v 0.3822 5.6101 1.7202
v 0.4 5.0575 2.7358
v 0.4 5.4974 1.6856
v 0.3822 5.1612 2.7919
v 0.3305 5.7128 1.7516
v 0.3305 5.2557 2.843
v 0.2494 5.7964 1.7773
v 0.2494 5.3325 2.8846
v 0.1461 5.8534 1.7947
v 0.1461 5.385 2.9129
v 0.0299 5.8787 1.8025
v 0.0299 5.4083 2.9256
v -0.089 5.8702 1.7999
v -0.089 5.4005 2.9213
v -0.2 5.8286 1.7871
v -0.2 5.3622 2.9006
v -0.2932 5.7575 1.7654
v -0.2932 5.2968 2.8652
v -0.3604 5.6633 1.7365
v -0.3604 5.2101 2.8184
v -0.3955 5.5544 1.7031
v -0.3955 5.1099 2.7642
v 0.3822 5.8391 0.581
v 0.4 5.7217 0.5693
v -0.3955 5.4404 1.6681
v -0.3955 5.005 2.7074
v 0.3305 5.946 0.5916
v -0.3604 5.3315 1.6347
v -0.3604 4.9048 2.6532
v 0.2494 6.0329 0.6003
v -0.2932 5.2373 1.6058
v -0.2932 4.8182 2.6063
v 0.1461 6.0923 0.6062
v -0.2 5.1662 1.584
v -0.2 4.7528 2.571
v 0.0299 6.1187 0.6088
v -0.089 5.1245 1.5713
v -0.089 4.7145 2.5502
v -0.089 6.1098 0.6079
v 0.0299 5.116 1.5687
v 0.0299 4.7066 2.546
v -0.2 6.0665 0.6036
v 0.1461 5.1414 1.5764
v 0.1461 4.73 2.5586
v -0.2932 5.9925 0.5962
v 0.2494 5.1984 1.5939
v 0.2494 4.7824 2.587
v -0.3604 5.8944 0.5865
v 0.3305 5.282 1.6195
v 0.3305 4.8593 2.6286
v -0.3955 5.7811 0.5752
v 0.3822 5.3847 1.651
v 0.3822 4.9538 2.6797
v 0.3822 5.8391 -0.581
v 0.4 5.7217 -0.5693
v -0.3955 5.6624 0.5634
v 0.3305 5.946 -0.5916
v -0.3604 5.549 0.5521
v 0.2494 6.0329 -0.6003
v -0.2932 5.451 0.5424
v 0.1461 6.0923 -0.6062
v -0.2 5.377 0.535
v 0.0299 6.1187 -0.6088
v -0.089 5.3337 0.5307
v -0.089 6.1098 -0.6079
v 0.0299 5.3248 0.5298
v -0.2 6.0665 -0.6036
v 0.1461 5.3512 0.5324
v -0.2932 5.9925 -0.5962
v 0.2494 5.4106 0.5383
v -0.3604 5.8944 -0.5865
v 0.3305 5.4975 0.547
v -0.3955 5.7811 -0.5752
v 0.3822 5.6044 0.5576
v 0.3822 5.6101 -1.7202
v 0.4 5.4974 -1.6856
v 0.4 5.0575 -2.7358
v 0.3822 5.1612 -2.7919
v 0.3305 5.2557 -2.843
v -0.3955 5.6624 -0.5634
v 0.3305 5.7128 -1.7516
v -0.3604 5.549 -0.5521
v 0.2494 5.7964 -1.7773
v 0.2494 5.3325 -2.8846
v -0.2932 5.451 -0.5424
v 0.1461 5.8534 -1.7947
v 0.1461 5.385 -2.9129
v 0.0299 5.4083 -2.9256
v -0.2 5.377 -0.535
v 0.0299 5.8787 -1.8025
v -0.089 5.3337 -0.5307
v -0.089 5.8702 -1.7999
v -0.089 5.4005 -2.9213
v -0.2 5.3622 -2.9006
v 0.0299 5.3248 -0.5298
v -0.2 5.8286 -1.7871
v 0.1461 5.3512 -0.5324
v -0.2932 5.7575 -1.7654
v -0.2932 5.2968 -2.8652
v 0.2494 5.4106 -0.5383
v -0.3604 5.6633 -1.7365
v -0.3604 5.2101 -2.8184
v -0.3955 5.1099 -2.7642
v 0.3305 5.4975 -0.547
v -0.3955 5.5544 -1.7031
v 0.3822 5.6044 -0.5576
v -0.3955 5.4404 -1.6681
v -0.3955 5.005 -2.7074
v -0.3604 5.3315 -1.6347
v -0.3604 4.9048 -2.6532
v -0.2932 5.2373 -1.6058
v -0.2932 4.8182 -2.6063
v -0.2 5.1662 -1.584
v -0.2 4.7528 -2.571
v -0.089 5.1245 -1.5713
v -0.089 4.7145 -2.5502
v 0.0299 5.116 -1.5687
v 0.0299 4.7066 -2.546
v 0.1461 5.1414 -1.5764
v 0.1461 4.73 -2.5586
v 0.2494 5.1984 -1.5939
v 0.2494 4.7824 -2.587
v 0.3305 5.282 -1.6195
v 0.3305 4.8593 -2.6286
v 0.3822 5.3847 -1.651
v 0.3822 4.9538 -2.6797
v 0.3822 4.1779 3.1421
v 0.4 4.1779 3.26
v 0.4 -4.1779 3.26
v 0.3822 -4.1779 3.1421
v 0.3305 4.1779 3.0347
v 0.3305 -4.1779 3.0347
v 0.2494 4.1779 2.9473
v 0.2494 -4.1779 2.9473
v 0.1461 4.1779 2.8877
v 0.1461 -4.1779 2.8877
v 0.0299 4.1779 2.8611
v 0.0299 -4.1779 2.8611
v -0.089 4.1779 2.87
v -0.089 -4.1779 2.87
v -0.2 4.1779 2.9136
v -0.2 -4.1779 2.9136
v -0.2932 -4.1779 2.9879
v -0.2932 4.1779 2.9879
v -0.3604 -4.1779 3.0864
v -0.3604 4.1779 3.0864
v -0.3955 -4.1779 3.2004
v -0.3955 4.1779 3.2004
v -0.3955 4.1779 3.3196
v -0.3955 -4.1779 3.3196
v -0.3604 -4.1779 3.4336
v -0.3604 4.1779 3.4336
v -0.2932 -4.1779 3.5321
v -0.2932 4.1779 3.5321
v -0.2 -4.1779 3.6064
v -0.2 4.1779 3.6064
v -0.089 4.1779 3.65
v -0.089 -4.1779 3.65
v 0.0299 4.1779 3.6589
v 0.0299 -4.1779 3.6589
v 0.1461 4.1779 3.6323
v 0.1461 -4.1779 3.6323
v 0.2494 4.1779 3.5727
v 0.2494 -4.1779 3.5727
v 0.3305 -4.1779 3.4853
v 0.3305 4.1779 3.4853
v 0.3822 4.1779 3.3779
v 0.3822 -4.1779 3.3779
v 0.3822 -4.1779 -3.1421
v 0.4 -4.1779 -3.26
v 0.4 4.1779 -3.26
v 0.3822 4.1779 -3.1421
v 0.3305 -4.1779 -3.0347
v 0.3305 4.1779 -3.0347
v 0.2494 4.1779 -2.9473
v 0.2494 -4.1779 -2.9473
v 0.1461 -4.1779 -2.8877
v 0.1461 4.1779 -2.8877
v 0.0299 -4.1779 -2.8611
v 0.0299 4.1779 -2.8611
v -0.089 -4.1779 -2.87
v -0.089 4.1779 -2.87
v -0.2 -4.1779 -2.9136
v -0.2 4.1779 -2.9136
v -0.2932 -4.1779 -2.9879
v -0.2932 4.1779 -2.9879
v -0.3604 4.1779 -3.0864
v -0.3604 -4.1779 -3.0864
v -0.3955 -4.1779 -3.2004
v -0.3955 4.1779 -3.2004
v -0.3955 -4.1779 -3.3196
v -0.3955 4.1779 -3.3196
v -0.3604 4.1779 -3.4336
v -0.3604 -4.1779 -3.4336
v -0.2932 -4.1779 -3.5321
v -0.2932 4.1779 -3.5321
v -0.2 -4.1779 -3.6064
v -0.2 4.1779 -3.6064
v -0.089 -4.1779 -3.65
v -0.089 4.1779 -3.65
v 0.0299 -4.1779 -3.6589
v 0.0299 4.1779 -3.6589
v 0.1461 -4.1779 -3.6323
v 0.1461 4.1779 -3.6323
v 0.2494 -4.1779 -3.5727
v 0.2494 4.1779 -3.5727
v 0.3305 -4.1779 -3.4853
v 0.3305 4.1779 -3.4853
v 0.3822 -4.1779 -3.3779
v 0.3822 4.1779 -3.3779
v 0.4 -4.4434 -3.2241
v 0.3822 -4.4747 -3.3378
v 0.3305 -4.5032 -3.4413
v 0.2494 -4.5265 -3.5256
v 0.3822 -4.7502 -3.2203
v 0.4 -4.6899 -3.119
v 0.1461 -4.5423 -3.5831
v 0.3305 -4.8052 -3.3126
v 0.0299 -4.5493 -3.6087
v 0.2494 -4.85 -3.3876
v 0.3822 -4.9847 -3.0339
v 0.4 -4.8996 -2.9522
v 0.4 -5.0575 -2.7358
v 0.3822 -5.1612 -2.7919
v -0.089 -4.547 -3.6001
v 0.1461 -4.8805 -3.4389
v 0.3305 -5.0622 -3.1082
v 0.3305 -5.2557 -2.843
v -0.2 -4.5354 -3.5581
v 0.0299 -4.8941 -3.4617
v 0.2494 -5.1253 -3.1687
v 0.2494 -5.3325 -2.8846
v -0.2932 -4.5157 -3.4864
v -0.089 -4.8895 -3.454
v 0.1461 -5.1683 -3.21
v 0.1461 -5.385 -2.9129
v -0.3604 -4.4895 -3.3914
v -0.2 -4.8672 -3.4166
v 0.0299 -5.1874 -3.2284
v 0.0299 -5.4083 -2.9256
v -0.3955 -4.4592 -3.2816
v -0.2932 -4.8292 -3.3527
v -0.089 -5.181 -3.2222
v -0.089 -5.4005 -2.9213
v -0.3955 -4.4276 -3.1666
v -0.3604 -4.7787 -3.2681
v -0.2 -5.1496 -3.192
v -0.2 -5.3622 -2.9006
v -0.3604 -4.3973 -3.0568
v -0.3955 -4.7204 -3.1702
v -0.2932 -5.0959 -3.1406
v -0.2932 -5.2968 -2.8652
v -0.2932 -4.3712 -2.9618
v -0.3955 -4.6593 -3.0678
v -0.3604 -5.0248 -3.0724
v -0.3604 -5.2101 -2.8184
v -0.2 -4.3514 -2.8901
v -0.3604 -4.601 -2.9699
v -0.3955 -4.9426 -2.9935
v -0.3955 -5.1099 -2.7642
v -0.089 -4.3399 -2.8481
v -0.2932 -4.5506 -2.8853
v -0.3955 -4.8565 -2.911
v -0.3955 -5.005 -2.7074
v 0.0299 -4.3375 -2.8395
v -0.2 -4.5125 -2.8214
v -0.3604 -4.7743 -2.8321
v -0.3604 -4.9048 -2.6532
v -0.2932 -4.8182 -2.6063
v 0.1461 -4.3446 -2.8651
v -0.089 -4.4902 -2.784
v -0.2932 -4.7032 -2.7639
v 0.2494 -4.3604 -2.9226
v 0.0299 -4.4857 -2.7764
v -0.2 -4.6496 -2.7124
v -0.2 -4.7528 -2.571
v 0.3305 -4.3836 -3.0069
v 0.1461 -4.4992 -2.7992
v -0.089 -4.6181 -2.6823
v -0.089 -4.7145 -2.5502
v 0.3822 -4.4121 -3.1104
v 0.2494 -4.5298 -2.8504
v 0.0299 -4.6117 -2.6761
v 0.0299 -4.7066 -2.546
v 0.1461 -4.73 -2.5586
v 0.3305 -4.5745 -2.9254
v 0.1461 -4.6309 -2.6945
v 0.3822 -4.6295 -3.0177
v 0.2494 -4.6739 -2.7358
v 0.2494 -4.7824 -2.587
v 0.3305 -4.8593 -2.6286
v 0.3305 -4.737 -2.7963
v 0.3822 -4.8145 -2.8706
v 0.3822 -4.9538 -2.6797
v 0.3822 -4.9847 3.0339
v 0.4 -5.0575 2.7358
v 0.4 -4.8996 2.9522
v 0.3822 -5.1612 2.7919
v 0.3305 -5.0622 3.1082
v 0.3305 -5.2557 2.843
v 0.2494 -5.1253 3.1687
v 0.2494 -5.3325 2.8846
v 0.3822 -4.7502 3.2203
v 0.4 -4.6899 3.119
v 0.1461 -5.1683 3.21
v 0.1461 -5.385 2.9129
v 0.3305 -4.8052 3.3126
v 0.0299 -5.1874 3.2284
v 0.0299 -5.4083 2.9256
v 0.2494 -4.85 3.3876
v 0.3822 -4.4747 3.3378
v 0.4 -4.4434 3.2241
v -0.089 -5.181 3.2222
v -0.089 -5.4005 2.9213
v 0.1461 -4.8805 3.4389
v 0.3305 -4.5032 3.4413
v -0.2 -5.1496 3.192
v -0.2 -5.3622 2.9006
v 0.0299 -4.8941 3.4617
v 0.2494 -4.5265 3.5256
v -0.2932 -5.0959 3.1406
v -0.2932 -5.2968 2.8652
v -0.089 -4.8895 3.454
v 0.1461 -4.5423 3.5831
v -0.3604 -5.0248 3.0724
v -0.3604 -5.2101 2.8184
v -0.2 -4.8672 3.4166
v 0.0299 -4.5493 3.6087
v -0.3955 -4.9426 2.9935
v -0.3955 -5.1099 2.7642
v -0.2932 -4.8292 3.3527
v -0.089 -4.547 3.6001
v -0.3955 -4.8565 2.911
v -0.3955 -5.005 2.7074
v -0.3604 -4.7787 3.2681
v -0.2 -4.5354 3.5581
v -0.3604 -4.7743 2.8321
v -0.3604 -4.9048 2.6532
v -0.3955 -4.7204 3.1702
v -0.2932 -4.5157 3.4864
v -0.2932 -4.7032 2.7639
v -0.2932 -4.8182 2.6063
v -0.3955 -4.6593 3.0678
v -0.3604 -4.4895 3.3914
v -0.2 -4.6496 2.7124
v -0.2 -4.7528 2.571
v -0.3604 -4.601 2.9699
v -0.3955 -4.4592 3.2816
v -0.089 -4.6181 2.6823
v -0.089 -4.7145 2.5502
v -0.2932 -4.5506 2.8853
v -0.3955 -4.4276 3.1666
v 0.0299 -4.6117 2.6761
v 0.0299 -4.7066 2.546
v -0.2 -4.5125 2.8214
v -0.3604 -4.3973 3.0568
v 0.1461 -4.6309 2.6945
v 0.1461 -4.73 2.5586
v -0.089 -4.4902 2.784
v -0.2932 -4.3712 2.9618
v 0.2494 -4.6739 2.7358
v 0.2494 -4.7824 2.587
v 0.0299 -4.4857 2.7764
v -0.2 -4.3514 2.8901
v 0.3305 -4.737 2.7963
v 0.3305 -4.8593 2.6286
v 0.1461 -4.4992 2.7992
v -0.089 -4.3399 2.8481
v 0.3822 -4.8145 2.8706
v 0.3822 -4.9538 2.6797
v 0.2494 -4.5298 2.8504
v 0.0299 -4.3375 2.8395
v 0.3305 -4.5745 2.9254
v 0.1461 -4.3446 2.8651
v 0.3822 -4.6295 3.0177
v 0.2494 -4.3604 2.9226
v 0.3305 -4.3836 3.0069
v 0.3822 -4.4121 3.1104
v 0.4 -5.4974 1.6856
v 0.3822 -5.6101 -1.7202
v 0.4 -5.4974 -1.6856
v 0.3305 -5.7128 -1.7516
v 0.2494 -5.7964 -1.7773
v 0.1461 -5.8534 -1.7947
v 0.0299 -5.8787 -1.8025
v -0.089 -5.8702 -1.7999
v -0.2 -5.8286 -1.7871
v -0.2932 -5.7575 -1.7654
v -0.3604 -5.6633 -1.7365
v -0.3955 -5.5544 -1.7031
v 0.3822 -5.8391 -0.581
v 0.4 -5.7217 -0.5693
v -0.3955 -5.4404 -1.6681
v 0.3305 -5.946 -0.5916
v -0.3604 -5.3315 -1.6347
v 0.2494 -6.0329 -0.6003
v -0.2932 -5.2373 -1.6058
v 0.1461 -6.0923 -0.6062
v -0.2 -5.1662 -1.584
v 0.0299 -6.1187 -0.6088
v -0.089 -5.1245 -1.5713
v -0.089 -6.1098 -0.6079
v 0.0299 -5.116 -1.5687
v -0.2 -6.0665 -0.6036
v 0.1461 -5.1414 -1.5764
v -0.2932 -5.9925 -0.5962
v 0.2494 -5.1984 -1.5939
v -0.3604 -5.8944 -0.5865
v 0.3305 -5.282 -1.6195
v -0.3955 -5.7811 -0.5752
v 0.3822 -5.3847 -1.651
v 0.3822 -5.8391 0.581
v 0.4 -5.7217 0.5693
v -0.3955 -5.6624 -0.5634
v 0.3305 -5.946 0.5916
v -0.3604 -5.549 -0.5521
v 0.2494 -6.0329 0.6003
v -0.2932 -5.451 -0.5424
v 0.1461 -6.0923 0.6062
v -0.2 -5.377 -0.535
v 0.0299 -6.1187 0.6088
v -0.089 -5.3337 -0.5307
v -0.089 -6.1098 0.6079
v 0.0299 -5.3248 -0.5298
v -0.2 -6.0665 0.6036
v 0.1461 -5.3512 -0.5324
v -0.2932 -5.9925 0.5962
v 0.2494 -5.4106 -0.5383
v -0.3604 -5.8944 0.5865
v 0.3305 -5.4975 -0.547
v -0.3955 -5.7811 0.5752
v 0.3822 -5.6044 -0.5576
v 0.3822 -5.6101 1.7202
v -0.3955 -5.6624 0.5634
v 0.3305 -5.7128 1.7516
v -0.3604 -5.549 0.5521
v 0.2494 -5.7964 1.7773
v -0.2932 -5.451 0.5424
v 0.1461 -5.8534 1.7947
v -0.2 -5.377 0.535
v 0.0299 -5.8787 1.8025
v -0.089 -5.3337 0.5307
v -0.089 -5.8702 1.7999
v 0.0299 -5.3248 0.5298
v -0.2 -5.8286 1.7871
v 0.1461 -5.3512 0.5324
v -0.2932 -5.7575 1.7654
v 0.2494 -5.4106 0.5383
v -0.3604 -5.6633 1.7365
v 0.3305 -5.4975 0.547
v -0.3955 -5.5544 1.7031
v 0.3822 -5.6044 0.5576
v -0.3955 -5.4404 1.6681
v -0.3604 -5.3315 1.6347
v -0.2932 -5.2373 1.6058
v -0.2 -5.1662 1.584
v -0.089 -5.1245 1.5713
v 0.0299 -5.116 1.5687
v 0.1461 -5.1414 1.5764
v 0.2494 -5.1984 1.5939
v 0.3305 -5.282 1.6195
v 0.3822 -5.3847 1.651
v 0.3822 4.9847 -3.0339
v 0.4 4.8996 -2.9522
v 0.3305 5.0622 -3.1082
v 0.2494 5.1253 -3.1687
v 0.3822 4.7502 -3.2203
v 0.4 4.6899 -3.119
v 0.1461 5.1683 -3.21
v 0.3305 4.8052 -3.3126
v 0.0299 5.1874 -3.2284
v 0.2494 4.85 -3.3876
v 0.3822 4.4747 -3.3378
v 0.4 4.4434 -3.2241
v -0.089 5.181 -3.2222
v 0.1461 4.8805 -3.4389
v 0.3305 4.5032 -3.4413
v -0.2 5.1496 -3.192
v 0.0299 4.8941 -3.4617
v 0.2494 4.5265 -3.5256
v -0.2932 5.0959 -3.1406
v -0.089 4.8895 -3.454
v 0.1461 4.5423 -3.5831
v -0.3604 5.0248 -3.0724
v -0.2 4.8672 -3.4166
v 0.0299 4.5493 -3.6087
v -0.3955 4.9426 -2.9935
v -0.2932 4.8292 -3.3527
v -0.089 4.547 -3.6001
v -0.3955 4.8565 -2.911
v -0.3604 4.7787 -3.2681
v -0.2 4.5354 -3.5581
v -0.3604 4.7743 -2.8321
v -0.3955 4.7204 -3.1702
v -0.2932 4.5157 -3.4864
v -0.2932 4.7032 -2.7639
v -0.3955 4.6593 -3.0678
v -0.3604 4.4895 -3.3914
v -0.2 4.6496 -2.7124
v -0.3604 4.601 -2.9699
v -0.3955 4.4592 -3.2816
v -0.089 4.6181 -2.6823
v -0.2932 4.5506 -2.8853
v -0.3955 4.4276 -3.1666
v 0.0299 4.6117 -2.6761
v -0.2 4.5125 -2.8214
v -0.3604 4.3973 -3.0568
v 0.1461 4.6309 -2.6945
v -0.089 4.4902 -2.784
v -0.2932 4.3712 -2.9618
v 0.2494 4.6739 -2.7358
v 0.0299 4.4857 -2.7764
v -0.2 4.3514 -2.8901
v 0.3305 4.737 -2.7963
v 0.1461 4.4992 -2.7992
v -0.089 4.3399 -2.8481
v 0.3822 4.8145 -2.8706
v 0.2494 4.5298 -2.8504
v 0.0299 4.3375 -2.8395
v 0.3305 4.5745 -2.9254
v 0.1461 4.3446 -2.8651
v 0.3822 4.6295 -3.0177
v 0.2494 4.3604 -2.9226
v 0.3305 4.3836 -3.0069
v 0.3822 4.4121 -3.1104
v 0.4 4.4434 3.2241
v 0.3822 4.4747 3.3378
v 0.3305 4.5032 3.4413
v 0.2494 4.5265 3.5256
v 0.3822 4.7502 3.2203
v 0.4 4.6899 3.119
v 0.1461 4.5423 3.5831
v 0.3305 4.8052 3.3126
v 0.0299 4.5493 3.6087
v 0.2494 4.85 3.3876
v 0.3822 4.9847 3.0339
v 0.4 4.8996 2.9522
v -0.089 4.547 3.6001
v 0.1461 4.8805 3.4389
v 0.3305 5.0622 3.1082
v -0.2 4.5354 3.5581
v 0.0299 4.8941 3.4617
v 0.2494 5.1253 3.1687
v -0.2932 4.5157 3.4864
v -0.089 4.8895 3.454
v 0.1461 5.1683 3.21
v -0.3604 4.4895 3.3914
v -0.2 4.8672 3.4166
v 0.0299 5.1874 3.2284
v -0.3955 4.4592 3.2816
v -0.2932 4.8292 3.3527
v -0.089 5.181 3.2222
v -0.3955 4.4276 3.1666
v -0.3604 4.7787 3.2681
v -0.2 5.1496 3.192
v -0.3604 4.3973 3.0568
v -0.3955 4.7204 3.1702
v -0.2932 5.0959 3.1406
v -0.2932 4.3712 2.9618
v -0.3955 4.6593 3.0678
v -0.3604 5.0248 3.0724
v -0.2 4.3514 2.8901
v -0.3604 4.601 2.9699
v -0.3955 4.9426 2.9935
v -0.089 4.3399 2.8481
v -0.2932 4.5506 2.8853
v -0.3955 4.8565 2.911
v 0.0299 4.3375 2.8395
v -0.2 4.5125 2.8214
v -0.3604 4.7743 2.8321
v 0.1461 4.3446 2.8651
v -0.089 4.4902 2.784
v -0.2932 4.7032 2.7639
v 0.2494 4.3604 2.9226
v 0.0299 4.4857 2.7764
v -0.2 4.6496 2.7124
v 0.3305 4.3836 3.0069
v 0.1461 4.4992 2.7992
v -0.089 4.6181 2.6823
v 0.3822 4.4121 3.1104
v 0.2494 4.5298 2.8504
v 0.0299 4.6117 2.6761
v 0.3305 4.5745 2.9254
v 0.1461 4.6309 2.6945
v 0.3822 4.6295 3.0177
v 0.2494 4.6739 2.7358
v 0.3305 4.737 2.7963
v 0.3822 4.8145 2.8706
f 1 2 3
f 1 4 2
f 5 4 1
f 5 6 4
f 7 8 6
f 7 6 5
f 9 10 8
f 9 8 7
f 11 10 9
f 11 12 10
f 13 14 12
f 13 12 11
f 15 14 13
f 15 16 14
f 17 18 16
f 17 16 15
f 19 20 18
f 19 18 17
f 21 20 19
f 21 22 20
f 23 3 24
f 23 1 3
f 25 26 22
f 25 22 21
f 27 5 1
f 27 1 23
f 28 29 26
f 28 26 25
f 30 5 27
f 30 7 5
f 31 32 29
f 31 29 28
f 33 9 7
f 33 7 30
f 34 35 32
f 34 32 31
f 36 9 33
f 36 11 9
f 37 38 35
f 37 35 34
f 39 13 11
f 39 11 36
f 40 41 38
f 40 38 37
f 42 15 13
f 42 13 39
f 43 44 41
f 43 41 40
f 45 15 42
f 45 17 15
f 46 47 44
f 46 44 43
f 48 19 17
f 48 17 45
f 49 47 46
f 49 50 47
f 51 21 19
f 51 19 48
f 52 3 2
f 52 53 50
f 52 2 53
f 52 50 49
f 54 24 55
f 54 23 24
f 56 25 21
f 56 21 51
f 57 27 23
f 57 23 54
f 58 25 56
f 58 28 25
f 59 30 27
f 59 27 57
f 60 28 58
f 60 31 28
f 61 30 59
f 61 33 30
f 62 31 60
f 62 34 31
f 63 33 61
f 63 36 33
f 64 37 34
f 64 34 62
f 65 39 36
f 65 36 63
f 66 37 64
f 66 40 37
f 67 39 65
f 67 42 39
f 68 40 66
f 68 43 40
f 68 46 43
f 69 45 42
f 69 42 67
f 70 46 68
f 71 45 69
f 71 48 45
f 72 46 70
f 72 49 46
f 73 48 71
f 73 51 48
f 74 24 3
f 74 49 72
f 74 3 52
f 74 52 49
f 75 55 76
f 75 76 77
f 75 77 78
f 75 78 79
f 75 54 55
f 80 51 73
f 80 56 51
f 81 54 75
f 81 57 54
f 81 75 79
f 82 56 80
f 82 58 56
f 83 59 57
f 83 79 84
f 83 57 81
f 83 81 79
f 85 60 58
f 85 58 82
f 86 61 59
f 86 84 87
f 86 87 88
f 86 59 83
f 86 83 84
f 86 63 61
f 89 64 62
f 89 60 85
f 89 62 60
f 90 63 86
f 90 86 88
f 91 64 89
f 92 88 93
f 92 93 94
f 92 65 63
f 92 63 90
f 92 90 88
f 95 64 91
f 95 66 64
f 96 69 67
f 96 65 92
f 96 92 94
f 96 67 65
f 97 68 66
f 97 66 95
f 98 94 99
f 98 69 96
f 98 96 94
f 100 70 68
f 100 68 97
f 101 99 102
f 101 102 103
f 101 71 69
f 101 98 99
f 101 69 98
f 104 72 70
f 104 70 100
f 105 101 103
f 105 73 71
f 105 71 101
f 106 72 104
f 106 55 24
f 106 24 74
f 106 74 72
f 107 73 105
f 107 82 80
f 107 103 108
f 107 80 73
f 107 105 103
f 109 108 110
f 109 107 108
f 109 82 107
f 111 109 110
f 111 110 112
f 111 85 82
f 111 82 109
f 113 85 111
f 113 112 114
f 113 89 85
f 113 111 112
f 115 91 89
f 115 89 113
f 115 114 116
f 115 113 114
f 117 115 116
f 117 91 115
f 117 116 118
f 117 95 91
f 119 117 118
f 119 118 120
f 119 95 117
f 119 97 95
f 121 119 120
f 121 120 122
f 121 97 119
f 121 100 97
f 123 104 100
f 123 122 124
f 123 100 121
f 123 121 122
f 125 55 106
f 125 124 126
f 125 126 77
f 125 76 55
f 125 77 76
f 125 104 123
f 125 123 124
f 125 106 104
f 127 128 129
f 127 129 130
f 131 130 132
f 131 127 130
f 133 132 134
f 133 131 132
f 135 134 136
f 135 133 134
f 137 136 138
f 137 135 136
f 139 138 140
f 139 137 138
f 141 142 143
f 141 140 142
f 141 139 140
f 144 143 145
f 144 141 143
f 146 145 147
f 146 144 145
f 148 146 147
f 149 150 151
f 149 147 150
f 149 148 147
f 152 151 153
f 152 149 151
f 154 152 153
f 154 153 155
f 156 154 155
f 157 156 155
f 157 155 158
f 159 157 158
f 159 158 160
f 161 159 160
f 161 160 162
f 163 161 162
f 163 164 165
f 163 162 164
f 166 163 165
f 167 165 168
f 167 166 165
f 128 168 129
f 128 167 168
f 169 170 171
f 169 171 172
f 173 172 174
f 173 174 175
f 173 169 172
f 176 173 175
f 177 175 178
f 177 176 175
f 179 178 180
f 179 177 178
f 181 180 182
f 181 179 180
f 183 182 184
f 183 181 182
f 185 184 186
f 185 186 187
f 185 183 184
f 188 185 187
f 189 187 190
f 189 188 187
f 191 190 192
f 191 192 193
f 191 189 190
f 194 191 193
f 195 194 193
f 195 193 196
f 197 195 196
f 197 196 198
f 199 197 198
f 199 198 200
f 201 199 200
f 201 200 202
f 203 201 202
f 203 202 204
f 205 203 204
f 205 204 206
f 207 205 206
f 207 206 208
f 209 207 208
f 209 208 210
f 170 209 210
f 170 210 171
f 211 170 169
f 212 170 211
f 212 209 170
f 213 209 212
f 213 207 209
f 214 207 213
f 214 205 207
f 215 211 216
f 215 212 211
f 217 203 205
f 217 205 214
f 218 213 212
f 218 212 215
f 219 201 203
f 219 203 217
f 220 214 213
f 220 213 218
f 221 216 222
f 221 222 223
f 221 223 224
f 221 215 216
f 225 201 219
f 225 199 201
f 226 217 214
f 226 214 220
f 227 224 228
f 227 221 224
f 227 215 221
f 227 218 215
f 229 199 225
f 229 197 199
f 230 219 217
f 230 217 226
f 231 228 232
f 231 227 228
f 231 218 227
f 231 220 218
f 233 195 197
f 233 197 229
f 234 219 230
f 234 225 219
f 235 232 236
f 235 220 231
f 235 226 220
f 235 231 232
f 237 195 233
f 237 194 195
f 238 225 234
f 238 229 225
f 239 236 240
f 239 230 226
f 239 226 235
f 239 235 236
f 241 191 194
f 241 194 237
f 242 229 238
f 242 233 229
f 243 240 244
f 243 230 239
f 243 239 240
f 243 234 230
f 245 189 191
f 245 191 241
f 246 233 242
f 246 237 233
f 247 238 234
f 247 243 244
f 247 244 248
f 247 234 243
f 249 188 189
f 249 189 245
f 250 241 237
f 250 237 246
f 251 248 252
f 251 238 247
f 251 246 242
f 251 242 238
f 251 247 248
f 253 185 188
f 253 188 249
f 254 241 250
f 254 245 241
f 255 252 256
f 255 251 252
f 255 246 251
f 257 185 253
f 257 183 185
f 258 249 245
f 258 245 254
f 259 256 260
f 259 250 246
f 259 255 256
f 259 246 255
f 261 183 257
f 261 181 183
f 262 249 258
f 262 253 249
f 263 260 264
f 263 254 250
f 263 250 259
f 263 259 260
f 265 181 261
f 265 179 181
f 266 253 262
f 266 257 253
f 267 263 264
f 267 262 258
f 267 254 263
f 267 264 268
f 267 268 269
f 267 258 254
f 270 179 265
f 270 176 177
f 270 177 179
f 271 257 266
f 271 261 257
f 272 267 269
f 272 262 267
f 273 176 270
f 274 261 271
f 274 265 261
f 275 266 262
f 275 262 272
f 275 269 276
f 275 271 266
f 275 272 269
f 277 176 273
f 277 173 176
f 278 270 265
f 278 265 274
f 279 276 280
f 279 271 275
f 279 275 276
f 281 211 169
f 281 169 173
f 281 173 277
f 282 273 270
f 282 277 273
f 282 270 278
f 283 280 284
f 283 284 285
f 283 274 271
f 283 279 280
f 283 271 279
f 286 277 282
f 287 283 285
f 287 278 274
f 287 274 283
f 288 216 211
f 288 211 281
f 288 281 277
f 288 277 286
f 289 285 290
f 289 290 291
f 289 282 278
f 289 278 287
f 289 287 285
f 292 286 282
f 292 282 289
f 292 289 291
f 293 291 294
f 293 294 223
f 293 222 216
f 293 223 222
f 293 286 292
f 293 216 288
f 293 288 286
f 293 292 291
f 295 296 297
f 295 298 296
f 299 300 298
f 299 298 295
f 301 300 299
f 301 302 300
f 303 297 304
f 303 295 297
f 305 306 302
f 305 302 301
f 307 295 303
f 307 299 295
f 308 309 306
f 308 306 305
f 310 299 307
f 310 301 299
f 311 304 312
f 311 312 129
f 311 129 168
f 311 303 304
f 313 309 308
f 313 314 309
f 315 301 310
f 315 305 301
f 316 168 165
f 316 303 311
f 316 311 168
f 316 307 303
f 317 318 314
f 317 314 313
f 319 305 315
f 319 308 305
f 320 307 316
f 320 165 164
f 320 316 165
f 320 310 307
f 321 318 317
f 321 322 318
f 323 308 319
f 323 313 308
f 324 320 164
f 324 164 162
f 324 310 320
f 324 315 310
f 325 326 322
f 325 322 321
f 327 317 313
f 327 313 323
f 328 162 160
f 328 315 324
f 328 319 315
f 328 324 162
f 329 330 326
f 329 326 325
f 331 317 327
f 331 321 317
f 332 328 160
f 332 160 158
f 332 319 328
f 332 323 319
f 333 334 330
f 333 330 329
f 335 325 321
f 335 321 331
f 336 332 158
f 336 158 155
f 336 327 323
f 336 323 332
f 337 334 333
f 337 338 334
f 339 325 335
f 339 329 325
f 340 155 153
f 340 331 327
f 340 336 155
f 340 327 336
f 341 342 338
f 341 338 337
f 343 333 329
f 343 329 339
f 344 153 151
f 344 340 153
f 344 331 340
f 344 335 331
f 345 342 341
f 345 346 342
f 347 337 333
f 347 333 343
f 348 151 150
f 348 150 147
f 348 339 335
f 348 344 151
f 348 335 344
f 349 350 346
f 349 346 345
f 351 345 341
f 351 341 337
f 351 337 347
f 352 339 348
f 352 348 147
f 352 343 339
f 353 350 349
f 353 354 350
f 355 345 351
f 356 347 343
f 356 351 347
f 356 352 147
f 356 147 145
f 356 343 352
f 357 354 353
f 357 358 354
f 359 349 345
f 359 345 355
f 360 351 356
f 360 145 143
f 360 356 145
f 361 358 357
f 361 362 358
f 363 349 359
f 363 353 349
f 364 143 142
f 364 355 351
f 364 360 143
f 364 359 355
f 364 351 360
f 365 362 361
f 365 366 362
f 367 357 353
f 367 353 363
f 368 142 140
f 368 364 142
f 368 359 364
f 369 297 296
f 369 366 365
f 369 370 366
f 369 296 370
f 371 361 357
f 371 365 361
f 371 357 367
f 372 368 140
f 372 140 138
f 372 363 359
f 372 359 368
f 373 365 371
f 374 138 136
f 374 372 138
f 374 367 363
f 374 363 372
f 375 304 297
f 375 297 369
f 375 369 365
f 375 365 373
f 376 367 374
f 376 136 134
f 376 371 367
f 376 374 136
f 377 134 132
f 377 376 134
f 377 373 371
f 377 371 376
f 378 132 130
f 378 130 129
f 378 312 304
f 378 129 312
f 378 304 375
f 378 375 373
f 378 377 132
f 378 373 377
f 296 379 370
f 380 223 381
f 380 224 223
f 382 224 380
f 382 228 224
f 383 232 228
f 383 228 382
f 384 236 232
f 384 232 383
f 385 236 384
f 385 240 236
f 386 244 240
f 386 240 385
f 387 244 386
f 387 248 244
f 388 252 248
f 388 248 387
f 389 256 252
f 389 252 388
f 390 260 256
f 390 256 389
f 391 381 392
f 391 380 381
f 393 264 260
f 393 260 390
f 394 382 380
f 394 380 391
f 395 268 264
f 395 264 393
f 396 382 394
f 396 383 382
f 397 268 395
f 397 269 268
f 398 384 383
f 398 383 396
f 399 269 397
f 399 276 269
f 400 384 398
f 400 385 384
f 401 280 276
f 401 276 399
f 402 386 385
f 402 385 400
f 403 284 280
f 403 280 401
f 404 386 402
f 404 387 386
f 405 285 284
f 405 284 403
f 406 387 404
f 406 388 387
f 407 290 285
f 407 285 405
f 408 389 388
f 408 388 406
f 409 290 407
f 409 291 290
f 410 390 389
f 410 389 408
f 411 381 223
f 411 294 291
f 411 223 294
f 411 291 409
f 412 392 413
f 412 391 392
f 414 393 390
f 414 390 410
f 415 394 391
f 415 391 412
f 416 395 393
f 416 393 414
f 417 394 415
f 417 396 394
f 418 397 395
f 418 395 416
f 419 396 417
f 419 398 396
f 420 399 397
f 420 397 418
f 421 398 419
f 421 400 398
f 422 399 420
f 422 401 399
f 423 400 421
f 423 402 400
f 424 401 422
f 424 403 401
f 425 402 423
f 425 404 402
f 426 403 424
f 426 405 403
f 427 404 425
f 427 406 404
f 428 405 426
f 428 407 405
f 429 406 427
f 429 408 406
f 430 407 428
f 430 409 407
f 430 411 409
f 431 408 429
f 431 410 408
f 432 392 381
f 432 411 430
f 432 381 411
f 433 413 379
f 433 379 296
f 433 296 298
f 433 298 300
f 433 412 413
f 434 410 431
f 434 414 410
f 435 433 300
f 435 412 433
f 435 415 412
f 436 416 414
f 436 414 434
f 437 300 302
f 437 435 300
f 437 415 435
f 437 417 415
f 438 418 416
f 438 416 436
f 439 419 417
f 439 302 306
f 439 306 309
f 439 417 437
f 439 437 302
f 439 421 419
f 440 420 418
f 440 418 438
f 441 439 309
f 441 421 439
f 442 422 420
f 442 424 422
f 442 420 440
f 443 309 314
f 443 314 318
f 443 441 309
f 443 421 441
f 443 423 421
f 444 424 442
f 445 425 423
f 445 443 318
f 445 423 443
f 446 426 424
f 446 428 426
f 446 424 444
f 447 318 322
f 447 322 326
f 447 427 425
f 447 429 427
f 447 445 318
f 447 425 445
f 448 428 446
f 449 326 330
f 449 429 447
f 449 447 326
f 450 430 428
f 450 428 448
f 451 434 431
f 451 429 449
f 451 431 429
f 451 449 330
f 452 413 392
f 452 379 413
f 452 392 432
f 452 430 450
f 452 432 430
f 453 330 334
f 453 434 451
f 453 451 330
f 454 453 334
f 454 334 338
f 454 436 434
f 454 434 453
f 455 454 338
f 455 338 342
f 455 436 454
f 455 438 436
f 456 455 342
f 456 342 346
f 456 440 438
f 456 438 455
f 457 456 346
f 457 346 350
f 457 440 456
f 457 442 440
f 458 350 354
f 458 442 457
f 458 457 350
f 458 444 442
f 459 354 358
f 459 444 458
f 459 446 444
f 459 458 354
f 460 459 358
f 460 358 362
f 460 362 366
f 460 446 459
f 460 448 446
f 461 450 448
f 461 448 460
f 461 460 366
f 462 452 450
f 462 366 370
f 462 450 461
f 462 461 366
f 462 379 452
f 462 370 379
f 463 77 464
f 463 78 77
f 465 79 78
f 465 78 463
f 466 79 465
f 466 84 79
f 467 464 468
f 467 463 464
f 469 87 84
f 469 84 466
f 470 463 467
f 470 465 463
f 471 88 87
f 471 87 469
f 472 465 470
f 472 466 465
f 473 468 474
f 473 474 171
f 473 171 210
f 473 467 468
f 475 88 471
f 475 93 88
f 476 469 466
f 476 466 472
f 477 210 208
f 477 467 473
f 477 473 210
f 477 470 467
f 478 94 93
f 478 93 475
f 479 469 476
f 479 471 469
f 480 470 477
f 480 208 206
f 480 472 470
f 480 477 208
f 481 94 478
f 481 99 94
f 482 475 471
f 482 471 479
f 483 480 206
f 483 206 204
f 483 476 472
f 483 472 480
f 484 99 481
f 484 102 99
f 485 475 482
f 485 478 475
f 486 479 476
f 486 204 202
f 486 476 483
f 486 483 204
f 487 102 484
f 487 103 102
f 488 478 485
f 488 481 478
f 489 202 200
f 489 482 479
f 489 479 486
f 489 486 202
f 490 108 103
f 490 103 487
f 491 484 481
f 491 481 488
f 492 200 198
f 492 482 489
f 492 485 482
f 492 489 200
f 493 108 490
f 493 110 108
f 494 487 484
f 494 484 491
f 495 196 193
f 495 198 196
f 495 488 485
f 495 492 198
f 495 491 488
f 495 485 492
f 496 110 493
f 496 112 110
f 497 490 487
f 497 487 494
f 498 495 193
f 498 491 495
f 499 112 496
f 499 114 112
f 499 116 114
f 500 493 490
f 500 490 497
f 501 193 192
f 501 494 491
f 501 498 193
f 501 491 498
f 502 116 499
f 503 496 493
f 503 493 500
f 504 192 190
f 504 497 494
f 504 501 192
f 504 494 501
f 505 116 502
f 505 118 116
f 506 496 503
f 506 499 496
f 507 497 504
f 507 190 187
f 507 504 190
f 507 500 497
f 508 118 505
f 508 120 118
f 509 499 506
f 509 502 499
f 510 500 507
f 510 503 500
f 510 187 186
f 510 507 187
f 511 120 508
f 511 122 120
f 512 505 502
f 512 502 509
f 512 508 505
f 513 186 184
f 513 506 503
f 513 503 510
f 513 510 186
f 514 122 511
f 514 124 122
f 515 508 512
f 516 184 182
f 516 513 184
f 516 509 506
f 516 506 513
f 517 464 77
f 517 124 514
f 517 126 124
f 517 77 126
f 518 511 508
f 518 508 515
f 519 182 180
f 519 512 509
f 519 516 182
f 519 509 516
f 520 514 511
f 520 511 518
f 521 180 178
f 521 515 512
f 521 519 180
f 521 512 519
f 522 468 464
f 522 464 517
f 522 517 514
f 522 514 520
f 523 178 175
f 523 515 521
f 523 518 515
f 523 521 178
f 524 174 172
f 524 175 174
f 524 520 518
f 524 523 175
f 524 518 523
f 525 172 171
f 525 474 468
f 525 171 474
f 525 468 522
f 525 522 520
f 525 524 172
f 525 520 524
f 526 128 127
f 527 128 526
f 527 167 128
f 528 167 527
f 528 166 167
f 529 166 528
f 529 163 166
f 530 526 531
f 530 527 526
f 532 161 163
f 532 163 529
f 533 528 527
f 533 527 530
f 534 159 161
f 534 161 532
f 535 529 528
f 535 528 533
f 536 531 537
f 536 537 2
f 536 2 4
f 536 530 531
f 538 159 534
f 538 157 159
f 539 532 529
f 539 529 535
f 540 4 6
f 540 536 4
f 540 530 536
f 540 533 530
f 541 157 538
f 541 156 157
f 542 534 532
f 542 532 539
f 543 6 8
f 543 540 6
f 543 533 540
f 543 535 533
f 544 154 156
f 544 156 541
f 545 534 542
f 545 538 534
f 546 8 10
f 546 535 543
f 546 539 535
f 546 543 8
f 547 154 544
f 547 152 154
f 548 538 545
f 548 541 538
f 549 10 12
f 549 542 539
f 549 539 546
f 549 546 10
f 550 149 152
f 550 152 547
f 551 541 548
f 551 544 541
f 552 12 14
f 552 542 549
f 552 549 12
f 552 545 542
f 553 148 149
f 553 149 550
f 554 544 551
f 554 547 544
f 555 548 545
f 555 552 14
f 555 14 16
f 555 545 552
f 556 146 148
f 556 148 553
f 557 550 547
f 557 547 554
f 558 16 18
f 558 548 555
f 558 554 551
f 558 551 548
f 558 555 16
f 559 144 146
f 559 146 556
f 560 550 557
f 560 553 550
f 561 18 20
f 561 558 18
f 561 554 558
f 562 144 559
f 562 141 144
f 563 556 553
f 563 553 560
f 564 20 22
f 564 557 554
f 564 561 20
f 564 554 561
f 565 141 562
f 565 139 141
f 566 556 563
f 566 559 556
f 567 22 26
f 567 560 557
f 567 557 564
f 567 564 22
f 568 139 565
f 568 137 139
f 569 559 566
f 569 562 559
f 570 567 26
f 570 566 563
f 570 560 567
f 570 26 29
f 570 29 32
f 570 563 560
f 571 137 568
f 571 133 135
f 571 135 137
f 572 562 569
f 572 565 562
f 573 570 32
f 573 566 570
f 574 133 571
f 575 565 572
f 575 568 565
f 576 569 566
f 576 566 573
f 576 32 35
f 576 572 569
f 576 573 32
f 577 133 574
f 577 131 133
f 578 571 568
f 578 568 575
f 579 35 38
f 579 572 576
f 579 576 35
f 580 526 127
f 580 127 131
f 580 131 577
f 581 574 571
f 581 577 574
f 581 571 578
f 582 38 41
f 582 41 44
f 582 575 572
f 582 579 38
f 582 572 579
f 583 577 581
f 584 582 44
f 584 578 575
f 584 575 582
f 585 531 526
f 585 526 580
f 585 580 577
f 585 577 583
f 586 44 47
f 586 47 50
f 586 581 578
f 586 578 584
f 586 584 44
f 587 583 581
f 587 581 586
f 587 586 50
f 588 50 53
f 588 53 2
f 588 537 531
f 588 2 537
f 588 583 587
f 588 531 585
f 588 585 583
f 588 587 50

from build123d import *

# Parameters (mm, degrees)
SKETCH2_R = 0.4


with BuildPart() as part:
    # Sweep1: sweep along a path in Sketch1
    with BuildLine(Plane(origin=(0, 0, 0), x_dir=(0, 0, -1), z_dir=(1, 0, 0))) as sweep1_path:
        Line((2.76, 4.177906174), (2.76, -4.177906174))
        ThreePointArc((2.76, -4.177906174), (2.689503998, -4.433887259), (2.497894737, -4.617685771))
        ThreePointArc((2.497894737, -4.617685771), (0, -5.25), (-2.497894737, -4.617685771))
        ThreePointArc((-2.497894737, -4.617685771), (-2.689503998, -4.433887259), (-2.76, -4.177906174))
        Line((-2.76, -4.177906174), (-2.76, 4.177906174))
        ThreePointArc((-2.76, 4.177906174), (-2.689503998, 4.433887259), (-2.497894737, 4.617685771))
        ThreePointArc((-2.497894737, 4.617685771), (0, 5.25), (2.497894737, 4.617685771))
        ThreePointArc((2.497894737, 4.617685771), (2.689503998, 4.433887259), (2.76, 4.177906174))
    # Sketch2 → Sweep1 (sweep)
    with BuildSketch(Plane(origin=(0, 0, 0), x_dir=(1, 0, 0), z_dir=(0, 1, 0))):
        with Locations((0, 3.26)):
            Circle(SKETCH2_R)
    sweep(path=sweep1_path.line)


solid = part.part
